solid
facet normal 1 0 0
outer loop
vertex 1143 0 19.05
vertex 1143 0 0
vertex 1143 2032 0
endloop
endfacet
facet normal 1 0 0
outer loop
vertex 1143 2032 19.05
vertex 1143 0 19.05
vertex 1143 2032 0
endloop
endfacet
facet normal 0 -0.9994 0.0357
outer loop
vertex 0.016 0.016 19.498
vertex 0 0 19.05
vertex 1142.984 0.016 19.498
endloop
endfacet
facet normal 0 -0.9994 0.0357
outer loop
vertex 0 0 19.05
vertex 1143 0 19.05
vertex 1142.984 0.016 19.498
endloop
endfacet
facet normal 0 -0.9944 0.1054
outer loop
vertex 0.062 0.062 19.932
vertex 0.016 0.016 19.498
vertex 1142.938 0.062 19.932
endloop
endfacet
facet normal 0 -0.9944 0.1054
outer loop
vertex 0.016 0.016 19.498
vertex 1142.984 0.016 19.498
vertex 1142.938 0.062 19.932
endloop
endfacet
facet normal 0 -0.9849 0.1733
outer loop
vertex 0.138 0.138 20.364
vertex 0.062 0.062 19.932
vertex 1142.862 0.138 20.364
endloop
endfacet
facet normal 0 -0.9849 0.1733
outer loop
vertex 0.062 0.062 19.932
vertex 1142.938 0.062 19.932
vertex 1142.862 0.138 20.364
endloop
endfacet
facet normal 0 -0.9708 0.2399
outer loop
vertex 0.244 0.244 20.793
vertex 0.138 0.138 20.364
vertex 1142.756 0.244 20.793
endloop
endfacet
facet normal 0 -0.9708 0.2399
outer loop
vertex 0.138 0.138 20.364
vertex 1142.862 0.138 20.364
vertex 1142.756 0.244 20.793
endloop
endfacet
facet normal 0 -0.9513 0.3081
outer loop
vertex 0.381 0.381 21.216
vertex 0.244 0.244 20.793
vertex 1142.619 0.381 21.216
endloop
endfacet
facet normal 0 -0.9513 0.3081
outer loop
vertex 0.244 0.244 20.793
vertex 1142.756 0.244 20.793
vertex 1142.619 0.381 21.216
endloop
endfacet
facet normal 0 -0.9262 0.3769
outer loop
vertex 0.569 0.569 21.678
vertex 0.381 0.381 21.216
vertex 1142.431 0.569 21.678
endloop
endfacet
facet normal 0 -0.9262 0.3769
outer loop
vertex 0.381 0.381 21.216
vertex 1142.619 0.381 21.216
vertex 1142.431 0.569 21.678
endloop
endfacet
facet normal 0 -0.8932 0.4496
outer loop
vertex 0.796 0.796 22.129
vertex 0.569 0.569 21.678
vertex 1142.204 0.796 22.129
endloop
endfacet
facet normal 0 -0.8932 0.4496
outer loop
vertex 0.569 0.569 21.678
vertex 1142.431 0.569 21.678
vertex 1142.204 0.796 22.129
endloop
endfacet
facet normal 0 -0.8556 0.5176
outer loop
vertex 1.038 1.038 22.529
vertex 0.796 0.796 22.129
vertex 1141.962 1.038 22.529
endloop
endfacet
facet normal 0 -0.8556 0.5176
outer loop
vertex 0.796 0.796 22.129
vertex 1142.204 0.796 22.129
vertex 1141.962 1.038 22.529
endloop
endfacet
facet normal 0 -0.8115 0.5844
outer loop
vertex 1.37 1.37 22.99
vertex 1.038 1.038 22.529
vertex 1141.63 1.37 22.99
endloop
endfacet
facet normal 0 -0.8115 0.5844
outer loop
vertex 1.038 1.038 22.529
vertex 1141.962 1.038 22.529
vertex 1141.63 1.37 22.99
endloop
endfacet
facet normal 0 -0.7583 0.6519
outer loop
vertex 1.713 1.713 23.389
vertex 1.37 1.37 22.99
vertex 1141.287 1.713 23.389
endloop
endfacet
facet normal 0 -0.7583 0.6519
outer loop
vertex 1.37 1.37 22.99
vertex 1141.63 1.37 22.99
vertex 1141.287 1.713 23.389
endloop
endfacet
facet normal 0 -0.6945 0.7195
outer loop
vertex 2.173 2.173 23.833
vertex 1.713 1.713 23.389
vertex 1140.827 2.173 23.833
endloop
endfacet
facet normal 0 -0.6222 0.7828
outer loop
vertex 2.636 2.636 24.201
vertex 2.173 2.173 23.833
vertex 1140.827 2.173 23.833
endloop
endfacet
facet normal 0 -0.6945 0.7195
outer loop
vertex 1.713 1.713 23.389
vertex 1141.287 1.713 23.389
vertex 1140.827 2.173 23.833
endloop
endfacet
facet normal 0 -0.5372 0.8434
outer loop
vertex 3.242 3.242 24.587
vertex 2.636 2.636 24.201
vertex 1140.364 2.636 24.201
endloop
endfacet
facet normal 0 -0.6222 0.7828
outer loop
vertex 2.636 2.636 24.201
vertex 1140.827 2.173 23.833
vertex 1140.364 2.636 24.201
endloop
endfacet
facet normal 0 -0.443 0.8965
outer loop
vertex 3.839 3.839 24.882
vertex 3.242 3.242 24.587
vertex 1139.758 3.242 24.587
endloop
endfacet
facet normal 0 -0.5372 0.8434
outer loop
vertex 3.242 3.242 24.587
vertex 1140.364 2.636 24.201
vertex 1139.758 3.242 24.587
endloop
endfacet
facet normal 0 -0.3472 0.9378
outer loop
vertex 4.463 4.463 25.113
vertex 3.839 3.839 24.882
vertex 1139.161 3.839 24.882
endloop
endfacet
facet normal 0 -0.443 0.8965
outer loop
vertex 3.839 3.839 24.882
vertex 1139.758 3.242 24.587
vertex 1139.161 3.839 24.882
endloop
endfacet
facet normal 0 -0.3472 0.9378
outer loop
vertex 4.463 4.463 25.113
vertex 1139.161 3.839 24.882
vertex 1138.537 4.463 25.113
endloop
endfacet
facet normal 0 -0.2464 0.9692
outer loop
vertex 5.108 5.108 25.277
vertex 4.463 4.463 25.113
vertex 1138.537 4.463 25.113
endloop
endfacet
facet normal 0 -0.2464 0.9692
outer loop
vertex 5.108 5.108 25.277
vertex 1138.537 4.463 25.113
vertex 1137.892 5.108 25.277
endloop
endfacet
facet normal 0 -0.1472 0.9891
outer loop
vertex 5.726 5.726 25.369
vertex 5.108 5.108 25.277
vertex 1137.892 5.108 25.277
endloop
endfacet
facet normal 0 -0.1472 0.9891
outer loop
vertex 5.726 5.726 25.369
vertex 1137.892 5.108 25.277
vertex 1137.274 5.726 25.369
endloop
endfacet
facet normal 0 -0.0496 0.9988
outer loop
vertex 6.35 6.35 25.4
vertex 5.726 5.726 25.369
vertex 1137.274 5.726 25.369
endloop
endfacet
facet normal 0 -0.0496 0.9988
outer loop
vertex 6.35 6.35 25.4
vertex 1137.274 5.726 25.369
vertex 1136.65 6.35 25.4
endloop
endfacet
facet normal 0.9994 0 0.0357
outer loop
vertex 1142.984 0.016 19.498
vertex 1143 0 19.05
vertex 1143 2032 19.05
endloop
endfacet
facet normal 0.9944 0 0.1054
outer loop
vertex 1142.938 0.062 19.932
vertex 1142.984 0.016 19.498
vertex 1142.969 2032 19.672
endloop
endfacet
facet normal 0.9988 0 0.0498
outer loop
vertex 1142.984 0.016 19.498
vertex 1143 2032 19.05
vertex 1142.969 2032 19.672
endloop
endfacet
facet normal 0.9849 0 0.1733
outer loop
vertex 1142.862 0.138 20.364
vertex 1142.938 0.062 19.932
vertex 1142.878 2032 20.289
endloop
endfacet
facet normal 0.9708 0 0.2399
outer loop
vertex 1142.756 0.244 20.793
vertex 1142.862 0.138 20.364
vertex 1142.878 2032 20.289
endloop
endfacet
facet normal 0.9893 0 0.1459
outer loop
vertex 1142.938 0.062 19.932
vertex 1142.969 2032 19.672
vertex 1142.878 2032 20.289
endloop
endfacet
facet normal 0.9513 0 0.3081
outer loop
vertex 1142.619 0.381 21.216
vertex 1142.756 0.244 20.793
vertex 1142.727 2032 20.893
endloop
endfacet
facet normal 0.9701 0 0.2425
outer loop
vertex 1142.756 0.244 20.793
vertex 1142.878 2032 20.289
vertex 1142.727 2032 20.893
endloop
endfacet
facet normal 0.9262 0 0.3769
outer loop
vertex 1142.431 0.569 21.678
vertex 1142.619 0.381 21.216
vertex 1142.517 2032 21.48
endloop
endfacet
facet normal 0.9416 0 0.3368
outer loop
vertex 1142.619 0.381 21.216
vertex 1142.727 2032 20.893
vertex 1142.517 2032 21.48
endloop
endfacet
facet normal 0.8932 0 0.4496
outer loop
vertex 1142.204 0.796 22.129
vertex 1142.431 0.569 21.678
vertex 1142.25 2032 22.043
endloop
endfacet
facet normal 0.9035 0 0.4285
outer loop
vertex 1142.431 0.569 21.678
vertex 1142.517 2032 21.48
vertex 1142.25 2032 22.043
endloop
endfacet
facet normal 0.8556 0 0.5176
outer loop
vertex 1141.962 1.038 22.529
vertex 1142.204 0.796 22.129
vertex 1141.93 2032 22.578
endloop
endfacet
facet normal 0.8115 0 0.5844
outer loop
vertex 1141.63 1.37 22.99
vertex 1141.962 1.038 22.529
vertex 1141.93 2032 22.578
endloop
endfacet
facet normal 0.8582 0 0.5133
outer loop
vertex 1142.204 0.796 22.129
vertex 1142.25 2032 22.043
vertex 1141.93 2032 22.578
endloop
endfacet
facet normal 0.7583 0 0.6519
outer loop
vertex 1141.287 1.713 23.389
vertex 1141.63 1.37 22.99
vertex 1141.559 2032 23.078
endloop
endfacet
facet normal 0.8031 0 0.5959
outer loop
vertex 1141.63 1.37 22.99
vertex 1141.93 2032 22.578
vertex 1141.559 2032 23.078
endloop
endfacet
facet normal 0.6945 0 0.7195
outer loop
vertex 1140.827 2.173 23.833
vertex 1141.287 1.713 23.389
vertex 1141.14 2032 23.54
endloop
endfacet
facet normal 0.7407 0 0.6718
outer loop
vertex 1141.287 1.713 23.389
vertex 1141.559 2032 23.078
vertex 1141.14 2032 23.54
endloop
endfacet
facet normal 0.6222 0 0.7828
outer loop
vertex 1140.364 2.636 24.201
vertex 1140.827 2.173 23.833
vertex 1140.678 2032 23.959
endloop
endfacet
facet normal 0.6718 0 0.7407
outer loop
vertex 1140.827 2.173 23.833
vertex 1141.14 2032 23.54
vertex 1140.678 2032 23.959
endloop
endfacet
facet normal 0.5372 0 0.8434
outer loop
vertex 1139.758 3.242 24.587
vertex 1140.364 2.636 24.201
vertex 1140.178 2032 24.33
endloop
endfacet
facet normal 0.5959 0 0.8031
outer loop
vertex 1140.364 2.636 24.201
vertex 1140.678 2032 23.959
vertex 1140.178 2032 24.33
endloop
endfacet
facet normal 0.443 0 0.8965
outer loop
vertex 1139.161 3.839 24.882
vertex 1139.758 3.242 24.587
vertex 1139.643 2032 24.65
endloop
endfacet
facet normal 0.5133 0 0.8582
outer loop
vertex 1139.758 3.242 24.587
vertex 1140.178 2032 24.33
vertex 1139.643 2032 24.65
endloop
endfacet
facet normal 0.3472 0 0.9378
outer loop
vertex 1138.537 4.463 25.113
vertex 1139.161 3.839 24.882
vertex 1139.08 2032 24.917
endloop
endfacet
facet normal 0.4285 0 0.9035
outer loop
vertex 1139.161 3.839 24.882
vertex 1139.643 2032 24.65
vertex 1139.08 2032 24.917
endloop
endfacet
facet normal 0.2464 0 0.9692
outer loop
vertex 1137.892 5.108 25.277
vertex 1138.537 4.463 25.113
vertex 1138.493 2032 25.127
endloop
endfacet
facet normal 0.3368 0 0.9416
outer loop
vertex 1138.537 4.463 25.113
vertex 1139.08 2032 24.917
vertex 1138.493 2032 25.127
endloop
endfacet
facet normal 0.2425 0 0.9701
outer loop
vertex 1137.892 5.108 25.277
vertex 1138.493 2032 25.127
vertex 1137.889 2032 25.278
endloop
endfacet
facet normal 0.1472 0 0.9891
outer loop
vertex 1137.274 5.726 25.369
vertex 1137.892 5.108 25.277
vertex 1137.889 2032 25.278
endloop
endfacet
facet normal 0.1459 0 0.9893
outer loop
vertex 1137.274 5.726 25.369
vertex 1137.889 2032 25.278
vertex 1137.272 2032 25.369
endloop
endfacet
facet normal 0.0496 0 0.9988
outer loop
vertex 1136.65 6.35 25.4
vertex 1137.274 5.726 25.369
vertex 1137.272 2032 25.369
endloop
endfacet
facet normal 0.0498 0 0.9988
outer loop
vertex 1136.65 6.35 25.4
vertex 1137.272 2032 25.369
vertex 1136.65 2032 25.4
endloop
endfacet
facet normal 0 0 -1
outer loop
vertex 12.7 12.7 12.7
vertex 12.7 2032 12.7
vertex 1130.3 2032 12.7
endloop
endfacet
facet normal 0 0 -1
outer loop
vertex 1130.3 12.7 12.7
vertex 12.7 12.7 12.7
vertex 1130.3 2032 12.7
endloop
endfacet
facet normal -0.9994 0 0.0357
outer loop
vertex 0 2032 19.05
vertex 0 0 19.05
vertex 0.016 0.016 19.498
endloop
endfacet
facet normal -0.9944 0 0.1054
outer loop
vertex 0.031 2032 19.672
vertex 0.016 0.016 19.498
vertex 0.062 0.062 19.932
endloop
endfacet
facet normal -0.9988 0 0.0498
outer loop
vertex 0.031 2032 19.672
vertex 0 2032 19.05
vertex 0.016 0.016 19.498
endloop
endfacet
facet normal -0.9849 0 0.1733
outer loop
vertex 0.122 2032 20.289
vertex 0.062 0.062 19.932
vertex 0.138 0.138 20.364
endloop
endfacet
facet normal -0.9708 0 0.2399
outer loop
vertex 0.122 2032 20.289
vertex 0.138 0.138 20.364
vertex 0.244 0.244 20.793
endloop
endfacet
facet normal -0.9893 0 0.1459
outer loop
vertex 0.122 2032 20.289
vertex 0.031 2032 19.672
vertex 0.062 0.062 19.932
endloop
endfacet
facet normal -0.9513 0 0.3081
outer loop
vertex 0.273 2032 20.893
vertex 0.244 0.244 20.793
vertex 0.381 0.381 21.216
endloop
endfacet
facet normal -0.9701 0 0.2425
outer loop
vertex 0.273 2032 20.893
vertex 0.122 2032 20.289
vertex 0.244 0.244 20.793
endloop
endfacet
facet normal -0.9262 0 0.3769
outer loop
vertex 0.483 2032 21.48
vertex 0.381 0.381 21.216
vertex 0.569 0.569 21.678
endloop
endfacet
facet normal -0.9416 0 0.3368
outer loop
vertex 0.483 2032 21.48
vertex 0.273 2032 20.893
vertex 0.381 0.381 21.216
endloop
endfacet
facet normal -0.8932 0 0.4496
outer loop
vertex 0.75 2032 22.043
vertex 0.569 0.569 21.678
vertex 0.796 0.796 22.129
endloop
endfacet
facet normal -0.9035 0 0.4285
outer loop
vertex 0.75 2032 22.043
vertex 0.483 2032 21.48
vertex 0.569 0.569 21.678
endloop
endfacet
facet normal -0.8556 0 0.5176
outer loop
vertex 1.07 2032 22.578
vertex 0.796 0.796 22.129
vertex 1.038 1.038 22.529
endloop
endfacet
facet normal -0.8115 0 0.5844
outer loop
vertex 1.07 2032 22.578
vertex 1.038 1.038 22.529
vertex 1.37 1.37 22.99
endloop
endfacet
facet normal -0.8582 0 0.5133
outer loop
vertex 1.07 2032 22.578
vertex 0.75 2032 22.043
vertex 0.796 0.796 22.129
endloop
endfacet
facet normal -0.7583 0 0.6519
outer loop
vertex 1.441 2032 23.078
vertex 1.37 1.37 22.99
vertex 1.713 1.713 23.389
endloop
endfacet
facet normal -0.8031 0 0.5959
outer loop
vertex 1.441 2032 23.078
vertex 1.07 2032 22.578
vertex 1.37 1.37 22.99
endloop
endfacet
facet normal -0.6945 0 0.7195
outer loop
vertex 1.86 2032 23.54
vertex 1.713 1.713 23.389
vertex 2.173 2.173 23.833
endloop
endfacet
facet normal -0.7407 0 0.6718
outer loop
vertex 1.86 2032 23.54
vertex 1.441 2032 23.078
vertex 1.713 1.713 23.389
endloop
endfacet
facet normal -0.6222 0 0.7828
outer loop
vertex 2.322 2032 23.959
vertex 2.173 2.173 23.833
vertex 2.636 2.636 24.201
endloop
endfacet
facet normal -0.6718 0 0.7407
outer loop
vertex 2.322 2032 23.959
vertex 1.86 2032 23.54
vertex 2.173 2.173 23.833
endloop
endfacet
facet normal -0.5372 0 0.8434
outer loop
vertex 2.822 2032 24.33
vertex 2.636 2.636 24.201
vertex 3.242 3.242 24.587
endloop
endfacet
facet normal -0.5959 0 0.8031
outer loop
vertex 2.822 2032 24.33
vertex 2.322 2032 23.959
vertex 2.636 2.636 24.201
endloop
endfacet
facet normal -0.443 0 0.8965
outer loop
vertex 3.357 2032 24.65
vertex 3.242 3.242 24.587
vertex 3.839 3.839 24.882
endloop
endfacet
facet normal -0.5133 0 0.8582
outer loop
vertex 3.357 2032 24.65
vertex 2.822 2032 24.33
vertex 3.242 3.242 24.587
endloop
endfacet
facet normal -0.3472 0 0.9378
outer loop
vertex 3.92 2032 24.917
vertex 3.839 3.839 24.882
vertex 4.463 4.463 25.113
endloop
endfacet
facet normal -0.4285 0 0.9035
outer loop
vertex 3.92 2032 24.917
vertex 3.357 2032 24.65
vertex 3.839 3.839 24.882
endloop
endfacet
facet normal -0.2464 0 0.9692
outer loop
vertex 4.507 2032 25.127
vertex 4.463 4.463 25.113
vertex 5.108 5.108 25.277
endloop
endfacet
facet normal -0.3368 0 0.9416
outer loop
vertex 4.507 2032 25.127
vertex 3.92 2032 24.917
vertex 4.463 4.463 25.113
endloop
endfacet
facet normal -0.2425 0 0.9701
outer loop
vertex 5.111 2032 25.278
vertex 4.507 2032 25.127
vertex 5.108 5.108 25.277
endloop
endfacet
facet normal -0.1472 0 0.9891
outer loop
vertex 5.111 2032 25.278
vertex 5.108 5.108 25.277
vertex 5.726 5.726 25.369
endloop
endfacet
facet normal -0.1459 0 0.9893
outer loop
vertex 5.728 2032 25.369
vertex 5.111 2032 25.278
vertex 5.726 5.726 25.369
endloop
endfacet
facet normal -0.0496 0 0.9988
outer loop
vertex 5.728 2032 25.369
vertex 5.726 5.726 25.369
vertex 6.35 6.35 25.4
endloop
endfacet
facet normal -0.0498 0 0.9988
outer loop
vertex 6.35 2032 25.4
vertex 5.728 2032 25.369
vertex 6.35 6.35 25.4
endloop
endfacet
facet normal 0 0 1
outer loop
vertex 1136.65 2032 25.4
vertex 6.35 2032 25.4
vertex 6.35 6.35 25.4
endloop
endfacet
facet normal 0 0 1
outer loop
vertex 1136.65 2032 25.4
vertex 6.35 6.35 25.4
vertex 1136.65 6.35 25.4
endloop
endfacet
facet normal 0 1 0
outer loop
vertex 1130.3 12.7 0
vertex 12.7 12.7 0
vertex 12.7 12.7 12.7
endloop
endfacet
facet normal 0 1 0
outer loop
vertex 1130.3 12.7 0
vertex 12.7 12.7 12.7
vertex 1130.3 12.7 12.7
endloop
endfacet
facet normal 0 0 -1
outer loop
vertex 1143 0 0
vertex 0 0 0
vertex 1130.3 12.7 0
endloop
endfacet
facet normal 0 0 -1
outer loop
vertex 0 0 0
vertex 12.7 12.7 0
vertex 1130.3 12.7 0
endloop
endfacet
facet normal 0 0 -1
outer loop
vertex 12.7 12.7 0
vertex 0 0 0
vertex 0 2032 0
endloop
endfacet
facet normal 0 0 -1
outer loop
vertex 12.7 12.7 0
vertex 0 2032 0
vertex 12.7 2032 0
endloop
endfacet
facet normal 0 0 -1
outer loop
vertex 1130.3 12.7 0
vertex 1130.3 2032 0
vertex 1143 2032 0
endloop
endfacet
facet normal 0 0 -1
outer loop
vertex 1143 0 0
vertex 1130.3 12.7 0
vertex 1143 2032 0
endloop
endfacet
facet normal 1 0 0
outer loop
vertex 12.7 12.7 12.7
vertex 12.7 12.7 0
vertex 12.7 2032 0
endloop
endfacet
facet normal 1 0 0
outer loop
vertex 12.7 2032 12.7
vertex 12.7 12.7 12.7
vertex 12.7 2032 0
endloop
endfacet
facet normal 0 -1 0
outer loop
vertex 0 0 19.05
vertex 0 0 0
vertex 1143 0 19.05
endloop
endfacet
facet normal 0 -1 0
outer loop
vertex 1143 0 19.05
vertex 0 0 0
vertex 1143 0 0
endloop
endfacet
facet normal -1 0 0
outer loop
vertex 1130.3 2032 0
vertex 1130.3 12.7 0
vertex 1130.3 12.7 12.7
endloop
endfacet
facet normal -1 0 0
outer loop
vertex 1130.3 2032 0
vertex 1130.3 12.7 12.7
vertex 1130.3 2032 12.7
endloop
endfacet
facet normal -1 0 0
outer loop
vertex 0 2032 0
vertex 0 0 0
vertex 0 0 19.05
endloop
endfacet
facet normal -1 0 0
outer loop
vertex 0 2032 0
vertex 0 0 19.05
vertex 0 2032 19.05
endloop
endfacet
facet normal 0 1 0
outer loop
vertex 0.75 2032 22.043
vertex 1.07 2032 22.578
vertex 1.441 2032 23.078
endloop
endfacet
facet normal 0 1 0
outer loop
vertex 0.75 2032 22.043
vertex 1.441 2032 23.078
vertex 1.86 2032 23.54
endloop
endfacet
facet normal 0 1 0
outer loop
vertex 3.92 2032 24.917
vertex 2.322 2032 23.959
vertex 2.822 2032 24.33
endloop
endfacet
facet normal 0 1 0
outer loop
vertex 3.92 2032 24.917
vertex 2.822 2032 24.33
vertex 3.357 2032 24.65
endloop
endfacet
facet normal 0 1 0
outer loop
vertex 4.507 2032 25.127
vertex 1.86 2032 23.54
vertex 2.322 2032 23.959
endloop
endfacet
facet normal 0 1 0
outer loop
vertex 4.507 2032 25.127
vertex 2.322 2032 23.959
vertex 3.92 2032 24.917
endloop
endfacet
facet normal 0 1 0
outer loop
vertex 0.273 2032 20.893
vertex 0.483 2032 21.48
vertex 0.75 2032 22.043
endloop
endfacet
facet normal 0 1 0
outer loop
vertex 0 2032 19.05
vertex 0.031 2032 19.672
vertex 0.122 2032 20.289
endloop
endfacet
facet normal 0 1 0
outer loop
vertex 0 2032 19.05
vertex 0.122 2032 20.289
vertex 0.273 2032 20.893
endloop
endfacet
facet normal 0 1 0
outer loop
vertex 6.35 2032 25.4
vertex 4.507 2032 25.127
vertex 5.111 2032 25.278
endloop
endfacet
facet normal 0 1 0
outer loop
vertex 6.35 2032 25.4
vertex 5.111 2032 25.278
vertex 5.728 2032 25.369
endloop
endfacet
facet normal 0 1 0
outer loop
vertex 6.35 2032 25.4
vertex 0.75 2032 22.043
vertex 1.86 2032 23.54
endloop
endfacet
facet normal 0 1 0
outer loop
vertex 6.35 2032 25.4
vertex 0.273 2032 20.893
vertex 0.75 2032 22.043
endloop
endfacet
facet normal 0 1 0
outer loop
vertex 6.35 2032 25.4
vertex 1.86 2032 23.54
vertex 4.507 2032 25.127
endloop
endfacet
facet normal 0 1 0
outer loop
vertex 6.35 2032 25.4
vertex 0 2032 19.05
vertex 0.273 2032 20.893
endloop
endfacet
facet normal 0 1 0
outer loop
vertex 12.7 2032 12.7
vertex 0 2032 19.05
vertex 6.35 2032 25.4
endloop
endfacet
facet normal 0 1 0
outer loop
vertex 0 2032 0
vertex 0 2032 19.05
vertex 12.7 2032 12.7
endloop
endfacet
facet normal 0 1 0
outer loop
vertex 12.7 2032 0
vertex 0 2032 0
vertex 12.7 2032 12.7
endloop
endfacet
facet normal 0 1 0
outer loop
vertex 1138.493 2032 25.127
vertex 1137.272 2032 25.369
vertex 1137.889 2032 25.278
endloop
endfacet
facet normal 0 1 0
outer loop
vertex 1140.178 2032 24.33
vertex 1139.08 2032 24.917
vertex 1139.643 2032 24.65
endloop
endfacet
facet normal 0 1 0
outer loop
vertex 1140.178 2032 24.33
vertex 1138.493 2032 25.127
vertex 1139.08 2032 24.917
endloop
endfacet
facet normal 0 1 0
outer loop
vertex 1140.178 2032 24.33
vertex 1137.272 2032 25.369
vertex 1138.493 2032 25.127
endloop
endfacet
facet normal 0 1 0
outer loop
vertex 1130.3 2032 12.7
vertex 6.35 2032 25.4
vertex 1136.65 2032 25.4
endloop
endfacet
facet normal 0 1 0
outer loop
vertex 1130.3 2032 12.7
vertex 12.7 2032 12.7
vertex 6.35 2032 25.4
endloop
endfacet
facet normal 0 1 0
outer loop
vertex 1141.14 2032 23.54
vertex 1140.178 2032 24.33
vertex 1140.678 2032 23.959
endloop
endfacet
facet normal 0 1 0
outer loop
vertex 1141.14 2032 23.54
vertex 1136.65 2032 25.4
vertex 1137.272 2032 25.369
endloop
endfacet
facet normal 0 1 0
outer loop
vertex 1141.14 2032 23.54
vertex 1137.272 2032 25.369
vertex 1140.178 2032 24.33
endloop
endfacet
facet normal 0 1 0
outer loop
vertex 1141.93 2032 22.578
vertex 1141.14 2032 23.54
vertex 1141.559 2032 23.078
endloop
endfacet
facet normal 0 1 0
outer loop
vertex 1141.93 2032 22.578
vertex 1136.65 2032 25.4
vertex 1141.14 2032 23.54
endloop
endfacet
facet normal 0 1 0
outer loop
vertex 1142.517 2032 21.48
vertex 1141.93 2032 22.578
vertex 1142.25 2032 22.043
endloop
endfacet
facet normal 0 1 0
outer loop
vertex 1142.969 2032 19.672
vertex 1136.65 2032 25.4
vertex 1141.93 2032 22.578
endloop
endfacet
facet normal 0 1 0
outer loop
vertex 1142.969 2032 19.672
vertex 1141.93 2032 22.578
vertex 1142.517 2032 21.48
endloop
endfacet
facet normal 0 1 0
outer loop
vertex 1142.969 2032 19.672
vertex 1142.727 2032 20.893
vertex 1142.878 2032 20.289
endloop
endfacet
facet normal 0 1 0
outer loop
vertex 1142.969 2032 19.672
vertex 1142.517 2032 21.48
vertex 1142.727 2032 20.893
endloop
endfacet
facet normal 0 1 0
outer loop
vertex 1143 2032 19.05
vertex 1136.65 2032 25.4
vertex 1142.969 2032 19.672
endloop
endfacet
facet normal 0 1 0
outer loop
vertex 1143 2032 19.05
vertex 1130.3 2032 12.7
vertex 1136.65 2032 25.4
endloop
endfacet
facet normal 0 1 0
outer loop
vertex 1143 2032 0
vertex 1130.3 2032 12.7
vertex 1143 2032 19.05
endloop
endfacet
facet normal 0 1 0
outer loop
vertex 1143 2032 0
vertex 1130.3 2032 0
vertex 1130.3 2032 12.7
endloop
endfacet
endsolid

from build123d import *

# Parameters (mm, degrees)
F0_W     = 1143
F0_H     = 2032
F1_DEPTH = 25.4
F2_T     = -12.7
F3_R     = 6.35


with BuildPart() as f1:
    # F0 (on Top) → F1 (new body)
    with BuildSketch(Plane.XY):
        with Locations((571.5, 1016)):
            Rectangle(F0_W, F0_H)
    extrude(amount=F1_DEPTH)

    # F2
    f2_openings = [f1.faces().sort_by_distance(p)[0] for p in [
        (571.5, 1016, 0),
        (571.5, 2032, 12.7),
    ]]
    offset(amount=F2_T, openings=f2_openings)

    # F3
    f3_edges = [f1.edges().sort_by_distance(p)[0] for p in [
        (1143, 1016, 25.4),
        (571.5, 0, 25.4),
        (0, 1016, 25.4),
    ]]
    fillet(f3_edges, radius=F3_R)


solid = f1.part
